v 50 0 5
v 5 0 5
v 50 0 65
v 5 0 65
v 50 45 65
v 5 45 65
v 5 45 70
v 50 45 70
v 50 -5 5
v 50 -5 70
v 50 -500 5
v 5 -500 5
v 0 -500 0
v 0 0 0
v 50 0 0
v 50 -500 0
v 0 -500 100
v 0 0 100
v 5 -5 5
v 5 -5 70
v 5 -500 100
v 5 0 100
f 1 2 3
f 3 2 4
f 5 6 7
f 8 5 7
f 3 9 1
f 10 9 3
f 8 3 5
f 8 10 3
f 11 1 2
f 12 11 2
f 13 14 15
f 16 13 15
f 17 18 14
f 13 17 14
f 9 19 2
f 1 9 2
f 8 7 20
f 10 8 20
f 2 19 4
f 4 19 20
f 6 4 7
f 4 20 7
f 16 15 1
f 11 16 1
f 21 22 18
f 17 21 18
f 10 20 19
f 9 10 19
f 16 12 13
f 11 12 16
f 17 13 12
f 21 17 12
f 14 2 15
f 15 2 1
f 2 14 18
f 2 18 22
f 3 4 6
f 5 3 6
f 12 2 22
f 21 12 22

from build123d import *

# Parameters (mm, degrees)
F1_DEPTH = 500
F3_DEPTH = 45


with BuildPart() as f1:
    # F0 (on Front) → F1 (new body)
    with BuildSketch(Plane.XZ):
        Polygon((0, 100), (0, 0), (50, 0), (50, 4.9999998882), (5, 4.9999998882), (5, 100), align=None)
    extrude(amount=F1_DEPTH)


with BuildPart() as f3:
    # F2 (on Right) → F3 (new body)
    with BuildSketch(Plane.YZ):
        Polygon((-4.9999982119, 70), (-4.9999982119, 4.9999998882), (0, 4.9999998882), (0, 65), (45.0000017881, 65), (45.0000017881, 70), align=None)
    extrude(amount=F3_DEPTH)


with BuildPart() as f3_1:
    # F4: moved
    add(f3.part.moved(Location((5, 0, 0))))


solid = Compound([f1.part, f3_1.part])
